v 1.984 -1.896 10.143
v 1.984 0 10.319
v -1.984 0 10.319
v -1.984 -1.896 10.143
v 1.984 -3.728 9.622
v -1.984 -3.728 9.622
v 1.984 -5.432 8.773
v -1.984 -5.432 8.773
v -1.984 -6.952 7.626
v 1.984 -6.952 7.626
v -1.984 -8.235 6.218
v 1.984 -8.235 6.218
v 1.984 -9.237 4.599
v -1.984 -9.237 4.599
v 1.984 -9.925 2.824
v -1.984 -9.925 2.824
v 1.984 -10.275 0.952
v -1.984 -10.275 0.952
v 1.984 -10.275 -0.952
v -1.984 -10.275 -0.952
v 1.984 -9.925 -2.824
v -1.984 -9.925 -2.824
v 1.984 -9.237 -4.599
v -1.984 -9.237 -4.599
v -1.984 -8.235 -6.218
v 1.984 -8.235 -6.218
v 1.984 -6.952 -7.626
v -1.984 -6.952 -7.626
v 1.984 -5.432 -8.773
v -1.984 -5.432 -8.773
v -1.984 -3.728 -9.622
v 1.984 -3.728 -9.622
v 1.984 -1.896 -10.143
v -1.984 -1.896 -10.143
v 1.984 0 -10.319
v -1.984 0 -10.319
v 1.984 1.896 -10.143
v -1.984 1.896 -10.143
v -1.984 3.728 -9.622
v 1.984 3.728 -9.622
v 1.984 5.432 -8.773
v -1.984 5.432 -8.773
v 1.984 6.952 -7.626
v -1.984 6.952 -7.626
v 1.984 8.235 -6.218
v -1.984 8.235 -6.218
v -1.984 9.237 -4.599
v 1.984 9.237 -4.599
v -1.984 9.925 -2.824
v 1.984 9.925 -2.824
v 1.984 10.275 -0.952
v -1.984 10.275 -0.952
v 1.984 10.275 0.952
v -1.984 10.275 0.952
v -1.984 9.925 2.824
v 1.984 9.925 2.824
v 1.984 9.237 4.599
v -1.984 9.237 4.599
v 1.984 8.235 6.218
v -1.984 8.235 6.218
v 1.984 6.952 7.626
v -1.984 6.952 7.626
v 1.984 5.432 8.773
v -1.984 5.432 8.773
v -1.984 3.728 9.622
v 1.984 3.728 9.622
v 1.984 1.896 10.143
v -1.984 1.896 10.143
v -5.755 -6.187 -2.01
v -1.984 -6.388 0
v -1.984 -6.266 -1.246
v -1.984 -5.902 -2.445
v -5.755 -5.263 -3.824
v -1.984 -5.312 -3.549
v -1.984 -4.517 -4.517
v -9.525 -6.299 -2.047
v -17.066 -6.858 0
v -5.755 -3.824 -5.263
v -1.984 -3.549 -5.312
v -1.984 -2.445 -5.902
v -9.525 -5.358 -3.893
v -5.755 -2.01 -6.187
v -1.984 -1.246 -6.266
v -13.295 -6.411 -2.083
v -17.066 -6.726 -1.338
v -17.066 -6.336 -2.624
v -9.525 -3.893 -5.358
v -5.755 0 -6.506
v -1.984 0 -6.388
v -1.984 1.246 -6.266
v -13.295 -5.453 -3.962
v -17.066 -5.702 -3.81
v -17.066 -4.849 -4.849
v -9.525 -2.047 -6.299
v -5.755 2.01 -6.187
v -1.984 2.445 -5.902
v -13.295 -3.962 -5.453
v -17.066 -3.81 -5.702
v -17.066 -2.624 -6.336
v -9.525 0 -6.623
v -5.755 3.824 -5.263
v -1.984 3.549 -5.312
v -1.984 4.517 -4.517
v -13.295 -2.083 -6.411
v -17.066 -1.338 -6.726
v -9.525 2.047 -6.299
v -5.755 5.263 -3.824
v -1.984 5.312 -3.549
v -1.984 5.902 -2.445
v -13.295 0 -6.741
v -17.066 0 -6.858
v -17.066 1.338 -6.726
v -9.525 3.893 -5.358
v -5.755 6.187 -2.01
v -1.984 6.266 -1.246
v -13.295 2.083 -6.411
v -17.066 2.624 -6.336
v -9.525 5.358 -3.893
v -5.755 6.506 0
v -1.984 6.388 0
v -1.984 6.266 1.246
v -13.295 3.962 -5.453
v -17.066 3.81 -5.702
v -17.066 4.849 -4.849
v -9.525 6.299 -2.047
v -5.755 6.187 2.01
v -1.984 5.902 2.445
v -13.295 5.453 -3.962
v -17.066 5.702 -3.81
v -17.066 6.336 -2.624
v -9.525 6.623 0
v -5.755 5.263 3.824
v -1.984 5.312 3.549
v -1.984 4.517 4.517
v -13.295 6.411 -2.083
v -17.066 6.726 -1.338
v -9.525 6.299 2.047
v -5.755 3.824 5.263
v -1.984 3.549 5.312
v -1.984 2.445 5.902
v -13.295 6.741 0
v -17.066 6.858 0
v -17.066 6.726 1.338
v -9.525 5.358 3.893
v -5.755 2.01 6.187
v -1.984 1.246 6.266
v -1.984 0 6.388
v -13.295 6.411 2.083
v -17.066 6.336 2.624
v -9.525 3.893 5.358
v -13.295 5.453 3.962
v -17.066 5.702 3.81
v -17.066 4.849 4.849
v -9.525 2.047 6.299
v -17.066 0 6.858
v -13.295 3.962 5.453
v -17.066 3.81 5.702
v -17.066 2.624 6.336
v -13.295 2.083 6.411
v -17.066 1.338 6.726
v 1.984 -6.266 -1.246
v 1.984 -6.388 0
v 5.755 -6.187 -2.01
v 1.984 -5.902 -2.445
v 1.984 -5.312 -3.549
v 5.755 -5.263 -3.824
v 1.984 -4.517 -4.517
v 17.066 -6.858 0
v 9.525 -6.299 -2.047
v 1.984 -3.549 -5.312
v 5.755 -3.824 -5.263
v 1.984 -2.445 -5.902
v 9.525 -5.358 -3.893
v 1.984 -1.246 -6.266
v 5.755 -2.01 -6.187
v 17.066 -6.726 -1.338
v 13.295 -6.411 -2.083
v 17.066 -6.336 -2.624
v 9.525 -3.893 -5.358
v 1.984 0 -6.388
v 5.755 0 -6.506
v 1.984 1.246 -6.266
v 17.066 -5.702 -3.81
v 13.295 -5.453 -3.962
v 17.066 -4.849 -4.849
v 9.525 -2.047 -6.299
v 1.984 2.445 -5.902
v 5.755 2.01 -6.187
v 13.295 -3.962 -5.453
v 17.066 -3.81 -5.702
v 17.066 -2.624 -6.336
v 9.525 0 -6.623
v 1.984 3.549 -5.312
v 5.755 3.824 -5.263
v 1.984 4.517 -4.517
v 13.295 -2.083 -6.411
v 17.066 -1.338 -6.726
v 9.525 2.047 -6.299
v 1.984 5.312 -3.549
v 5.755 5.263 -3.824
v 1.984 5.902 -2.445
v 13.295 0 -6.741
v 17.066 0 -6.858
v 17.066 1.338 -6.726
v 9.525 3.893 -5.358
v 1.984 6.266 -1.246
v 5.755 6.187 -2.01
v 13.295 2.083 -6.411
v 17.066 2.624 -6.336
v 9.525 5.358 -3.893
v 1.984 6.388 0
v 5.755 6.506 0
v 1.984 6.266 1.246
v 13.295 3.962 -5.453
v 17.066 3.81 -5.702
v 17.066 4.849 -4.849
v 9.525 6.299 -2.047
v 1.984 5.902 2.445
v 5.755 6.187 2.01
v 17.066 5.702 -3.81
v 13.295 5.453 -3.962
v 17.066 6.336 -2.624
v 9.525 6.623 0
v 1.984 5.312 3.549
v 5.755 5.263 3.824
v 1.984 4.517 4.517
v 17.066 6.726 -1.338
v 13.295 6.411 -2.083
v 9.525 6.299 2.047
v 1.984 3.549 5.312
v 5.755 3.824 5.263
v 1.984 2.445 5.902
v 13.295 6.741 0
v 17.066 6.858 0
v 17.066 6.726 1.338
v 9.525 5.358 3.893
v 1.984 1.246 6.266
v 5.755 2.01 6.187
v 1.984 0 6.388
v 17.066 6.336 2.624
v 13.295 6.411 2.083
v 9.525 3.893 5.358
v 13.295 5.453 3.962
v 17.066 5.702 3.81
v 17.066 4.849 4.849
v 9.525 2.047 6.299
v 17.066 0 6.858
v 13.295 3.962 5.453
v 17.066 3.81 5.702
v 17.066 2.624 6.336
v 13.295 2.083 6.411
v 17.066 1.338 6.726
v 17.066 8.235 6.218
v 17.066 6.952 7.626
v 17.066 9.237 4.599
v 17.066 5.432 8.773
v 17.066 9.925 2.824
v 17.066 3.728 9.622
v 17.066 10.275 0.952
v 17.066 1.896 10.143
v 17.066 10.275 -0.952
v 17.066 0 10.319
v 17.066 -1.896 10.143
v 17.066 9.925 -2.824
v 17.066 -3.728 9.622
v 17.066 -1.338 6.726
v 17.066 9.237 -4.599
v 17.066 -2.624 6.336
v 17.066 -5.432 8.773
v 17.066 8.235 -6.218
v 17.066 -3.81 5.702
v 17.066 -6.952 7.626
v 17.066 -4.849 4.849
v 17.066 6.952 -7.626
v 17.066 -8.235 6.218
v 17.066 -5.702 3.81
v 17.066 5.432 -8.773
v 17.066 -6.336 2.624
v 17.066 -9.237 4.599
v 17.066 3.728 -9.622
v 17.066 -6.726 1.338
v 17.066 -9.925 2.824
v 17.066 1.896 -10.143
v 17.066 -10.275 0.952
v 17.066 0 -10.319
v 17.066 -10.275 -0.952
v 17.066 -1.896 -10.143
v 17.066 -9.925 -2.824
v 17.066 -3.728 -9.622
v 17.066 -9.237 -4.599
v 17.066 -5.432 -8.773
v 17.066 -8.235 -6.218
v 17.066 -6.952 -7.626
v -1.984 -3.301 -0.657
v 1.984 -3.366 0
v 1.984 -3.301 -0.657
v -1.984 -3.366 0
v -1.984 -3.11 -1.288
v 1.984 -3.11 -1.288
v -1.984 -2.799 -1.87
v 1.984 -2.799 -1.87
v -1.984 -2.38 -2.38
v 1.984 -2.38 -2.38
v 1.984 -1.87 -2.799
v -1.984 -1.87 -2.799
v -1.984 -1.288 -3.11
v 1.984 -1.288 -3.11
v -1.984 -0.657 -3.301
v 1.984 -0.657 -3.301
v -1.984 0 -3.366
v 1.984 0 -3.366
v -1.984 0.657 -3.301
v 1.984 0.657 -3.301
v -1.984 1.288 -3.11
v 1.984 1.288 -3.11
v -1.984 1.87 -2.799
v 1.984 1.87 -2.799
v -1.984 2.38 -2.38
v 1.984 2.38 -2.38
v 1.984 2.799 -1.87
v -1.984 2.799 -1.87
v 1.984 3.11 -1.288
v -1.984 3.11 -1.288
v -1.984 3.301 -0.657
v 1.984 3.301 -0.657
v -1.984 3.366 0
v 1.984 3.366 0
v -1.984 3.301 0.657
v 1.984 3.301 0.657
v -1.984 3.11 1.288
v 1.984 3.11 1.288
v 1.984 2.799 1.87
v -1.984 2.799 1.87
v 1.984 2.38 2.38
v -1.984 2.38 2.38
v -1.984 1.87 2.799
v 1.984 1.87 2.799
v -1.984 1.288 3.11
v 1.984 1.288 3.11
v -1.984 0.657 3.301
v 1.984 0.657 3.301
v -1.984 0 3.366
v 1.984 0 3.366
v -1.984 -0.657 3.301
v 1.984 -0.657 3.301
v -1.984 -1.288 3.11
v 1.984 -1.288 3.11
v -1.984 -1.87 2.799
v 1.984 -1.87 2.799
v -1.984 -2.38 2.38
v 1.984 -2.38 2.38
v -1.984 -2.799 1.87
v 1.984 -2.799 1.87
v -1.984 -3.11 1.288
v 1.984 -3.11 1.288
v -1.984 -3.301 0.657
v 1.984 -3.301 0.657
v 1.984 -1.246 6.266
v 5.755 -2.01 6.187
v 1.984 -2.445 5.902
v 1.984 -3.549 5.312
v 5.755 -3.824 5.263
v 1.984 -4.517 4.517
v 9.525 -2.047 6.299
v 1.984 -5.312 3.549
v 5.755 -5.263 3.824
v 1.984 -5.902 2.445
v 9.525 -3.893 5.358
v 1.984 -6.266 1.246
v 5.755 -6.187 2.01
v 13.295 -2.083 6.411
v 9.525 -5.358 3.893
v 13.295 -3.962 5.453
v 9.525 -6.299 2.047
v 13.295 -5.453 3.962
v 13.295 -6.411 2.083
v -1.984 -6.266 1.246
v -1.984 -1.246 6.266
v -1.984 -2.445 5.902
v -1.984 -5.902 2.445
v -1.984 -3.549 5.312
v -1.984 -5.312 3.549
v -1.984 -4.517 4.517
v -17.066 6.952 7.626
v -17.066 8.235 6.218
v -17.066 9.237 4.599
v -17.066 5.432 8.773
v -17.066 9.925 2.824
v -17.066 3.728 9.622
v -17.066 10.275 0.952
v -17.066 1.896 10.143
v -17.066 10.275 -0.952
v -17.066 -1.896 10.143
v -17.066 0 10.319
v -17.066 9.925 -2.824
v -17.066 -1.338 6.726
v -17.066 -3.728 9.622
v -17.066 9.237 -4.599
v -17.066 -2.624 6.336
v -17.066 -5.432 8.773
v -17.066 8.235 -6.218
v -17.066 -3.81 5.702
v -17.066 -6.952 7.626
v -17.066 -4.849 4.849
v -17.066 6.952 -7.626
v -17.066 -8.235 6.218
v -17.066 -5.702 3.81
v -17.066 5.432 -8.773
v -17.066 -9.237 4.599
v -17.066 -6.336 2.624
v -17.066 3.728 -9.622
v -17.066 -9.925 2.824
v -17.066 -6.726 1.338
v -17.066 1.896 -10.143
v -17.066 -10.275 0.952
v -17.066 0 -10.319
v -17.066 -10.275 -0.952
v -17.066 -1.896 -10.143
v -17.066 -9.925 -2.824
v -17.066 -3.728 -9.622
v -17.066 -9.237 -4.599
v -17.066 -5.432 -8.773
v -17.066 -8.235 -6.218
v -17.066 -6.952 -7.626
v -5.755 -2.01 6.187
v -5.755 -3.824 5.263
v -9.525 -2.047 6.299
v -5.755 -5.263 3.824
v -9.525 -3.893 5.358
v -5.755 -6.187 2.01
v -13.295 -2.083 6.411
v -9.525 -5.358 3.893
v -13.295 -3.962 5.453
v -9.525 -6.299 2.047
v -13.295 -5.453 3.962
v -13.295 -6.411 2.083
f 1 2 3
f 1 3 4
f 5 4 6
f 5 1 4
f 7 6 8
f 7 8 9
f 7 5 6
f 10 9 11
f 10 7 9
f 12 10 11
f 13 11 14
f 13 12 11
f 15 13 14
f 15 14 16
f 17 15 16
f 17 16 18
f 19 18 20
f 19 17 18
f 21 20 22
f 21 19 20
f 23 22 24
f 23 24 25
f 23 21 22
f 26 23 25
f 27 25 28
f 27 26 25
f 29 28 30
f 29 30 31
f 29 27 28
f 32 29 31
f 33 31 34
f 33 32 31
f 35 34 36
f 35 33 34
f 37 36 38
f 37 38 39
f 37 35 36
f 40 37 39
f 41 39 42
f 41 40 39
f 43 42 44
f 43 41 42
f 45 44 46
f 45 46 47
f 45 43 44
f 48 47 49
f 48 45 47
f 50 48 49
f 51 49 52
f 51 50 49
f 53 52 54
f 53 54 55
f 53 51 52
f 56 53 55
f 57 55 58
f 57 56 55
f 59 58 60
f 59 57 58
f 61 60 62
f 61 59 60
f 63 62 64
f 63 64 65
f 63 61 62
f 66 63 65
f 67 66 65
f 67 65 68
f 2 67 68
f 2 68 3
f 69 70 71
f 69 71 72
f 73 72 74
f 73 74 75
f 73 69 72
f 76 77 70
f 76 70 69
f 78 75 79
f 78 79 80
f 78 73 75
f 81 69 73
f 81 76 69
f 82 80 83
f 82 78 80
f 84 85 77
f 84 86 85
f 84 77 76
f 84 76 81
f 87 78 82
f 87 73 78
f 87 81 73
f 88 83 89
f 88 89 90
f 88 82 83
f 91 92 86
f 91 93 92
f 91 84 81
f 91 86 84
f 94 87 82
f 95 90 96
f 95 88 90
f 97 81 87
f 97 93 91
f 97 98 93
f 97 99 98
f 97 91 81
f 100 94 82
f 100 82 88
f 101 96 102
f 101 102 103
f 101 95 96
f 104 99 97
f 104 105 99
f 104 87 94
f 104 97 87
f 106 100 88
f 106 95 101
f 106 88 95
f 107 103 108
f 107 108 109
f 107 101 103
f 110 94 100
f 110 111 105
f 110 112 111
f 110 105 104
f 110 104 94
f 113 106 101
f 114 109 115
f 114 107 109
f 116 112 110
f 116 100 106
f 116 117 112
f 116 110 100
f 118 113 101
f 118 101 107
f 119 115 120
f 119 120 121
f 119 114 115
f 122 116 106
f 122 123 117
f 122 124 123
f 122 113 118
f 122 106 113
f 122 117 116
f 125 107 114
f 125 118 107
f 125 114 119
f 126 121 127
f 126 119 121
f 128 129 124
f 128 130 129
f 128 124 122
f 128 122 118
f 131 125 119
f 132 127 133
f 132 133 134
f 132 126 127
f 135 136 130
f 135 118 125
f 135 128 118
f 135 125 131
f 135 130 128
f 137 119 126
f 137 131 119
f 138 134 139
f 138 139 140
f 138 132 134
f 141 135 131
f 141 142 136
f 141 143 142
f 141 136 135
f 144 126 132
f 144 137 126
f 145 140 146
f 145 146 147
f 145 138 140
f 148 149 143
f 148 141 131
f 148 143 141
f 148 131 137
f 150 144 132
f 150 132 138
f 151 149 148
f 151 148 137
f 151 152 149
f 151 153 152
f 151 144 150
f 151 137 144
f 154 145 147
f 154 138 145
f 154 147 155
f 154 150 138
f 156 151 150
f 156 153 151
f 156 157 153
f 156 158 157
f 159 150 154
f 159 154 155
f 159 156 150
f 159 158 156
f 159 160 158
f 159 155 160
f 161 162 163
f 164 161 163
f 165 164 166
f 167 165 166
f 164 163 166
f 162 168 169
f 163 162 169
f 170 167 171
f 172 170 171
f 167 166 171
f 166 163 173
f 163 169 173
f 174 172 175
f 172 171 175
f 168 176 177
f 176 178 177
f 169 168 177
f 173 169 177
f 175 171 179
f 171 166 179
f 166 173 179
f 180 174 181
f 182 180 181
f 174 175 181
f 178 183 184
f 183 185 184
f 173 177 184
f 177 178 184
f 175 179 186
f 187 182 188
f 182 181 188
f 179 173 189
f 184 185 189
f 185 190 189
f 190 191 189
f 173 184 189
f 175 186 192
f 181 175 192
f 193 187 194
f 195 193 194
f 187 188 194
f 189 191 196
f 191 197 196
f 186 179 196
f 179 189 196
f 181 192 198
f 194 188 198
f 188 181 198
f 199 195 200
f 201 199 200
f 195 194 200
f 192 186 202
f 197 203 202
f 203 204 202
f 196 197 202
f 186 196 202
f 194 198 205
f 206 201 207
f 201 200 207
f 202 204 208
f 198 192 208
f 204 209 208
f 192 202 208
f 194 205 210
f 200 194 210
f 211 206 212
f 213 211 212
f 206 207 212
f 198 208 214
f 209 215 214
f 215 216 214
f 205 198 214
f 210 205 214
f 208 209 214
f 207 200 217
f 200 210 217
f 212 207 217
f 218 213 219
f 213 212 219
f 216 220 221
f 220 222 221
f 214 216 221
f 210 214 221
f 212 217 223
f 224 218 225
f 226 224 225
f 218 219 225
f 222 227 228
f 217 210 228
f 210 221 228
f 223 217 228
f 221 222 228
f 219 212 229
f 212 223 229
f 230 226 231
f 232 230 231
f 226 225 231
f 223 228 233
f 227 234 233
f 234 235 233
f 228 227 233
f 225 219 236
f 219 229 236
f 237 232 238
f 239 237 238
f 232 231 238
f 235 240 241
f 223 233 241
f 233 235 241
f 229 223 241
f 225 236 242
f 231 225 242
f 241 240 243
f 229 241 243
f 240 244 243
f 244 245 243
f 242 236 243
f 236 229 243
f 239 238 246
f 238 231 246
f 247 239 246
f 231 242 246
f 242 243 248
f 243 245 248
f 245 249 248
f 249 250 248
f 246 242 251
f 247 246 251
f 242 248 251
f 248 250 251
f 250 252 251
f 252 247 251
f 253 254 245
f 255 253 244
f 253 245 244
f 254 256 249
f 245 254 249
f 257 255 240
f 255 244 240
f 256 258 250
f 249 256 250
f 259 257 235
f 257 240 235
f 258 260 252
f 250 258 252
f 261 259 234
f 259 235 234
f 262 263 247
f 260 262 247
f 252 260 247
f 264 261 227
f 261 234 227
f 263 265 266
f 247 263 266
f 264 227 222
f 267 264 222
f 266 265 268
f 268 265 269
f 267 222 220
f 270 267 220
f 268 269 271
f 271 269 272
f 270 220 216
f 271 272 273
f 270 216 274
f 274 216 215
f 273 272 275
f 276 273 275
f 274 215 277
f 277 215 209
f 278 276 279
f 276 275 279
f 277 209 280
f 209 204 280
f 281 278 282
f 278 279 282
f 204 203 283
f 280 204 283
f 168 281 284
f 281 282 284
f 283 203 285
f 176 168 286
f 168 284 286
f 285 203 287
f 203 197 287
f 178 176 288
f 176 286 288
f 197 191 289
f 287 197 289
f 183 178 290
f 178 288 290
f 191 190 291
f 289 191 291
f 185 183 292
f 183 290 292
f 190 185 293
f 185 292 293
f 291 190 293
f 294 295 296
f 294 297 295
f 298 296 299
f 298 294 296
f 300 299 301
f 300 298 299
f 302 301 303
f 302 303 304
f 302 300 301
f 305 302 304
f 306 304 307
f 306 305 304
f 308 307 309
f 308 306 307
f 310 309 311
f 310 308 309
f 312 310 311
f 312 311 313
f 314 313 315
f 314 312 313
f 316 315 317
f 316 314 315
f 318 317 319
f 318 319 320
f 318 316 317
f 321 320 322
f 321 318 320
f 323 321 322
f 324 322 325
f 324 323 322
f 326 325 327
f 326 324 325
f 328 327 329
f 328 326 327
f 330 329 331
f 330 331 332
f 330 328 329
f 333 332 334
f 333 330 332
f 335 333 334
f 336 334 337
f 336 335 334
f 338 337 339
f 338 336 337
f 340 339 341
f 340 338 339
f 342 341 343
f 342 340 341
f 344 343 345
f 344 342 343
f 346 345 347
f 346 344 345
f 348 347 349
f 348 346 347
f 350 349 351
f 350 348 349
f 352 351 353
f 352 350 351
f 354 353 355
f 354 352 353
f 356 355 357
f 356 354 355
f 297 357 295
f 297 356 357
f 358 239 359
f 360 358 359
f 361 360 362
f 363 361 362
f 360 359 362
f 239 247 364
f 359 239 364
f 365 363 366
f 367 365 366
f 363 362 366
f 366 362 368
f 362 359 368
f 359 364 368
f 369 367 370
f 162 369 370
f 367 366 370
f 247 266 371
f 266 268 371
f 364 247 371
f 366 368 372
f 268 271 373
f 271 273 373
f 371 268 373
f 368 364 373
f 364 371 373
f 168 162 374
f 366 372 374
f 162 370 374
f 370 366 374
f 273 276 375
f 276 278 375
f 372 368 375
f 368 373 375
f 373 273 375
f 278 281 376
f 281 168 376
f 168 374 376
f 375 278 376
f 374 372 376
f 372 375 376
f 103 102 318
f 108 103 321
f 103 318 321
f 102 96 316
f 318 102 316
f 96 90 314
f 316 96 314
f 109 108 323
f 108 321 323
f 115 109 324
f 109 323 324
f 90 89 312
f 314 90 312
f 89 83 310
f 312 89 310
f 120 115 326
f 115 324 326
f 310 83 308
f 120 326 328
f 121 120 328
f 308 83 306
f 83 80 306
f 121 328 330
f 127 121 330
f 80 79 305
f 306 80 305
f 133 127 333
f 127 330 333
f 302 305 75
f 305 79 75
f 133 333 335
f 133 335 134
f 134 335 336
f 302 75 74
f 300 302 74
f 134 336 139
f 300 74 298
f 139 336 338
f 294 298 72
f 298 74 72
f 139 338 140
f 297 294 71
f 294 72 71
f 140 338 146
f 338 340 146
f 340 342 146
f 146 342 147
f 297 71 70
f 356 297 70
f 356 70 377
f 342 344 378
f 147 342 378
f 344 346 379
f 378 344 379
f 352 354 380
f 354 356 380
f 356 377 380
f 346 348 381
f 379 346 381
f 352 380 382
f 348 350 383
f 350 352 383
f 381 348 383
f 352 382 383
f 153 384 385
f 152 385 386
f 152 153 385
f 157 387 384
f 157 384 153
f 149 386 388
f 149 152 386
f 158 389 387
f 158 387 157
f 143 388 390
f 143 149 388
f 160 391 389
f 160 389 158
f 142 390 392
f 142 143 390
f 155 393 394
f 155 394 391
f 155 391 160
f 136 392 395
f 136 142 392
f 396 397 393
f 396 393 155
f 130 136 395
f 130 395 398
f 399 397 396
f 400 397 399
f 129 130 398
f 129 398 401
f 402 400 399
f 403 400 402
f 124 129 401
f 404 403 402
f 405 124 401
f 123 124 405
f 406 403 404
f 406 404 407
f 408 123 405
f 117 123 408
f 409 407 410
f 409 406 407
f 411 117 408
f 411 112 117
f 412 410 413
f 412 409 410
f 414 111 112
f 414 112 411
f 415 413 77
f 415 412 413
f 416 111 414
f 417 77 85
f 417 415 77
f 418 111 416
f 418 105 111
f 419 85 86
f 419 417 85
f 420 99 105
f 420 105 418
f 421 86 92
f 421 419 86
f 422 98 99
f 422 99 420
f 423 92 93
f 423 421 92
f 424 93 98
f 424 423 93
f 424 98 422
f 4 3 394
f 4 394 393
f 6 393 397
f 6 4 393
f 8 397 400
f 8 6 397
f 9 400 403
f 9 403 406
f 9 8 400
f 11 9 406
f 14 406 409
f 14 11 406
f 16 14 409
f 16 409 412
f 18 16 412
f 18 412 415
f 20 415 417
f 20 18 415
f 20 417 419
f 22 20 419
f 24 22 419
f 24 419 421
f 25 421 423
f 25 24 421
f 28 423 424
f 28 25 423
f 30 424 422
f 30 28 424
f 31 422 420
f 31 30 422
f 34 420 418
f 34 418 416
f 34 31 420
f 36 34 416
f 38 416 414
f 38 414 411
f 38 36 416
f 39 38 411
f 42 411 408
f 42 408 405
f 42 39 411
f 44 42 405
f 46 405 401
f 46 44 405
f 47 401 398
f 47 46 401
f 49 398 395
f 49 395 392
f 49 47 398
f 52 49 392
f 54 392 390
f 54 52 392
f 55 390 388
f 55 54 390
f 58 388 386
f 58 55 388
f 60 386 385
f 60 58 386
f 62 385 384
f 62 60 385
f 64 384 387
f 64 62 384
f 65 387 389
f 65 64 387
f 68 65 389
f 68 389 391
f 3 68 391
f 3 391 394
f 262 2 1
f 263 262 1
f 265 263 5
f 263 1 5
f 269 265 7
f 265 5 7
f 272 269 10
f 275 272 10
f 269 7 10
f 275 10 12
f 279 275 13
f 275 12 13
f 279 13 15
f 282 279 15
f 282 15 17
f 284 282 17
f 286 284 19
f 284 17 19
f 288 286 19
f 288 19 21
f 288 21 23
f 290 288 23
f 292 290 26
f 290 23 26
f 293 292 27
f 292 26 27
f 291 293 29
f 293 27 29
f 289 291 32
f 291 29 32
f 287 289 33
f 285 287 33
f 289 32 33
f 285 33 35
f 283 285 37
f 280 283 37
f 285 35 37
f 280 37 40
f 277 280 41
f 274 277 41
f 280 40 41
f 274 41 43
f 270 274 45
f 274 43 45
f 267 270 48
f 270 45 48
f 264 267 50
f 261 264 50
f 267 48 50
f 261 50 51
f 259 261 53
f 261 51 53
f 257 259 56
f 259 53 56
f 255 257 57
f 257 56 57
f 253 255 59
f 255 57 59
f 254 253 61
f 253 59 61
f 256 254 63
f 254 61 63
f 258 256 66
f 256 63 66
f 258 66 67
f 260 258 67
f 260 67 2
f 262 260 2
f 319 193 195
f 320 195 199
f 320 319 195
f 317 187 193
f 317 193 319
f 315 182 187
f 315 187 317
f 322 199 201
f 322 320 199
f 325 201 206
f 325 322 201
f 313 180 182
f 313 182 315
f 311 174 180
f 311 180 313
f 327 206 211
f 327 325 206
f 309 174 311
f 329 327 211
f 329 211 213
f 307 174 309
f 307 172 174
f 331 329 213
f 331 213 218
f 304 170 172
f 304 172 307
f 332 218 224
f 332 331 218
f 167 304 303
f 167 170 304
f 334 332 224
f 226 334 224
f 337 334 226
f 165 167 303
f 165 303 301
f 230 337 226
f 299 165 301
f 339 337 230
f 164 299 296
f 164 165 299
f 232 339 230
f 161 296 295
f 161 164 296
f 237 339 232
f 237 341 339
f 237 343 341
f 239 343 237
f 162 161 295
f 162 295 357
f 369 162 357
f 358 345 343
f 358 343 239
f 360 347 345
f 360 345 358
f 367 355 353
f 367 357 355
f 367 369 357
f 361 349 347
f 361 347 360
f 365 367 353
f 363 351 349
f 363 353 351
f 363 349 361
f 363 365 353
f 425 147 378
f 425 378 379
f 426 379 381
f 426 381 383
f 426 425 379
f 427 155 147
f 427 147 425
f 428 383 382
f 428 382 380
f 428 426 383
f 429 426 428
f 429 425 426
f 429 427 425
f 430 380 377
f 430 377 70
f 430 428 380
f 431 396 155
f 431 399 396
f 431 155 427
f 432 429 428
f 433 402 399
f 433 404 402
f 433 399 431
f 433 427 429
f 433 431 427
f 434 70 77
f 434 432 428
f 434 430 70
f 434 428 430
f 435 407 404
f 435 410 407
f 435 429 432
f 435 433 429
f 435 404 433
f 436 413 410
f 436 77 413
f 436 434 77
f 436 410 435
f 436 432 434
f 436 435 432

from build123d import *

# Parameters (mm, degrees)
BOSS_EXTRUDE1_START = 3.96875
SKETCH3_R           = 10.31875
BOSS_EXTRUDE1_DEPTH = 3.96875


with BuildPart() as part:
    # Sketch1 → Revolve1 (revolve)
    with BuildSketch(Plane.XY, mode=Mode.PRIVATE) as revolve1_sk:
        Polygon((-17.065625, -10.31875), (-1.984375, -10.31875), (-1.984375, -6.388443876), (-17.065625, -6.858), align=None)
    revolve(revolve1_sk.sketch.rotate(Axis((-17.065625, 0, 0), (1, 0, 0)), 270), axis=Axis((-17.065625, 0, 0), (1, 0, 0)))


with BuildPart() as body_2:
    # Mirror2: mirrored copy
    add(part.part.mirror(Plane(origin=(0, 0, 0), x_dir=(0, 0, 1), z_dir=(1, 0, 0))))


with BuildPart() as part_1:
    add(part.part)

    add(body_2.part)  # Boss-Extrude1 merges body 2
    # Sketch3 → Boss-Extrude1 (add)
    with BuildSketch(Plane(origin=(-1.984375, 0, 0), x_dir=(0, 0, -1), z_dir=(1, 0, 0)).offset(BOSS_EXTRUDE1_START)):
        with Locations(Location((0, 0, 0), (0, 0, 180))):
            Circle(SKETCH3_R)
    extrude(amount=-BOSS_EXTRUDE1_DEPTH)

    # Sketch8 → Cut-Revolve1 (revolve, cut)
    with BuildSketch(Plane.XY):
        Polygon((-17.065625, 0), (17.065625, 0), (17.065625, -6.858), (1.984375, -6.388443876), (1.984375, -3.365843876), (-1.984375, -3.365843876), (-1.984375, -6.388443876), (-17.065625, -6.858), align=None)
    revolve(axis=Axis((-17.065625, 0, 0), (1, 0, 0)), mode=Mode.SUBTRACT)


solid = part_1.part
